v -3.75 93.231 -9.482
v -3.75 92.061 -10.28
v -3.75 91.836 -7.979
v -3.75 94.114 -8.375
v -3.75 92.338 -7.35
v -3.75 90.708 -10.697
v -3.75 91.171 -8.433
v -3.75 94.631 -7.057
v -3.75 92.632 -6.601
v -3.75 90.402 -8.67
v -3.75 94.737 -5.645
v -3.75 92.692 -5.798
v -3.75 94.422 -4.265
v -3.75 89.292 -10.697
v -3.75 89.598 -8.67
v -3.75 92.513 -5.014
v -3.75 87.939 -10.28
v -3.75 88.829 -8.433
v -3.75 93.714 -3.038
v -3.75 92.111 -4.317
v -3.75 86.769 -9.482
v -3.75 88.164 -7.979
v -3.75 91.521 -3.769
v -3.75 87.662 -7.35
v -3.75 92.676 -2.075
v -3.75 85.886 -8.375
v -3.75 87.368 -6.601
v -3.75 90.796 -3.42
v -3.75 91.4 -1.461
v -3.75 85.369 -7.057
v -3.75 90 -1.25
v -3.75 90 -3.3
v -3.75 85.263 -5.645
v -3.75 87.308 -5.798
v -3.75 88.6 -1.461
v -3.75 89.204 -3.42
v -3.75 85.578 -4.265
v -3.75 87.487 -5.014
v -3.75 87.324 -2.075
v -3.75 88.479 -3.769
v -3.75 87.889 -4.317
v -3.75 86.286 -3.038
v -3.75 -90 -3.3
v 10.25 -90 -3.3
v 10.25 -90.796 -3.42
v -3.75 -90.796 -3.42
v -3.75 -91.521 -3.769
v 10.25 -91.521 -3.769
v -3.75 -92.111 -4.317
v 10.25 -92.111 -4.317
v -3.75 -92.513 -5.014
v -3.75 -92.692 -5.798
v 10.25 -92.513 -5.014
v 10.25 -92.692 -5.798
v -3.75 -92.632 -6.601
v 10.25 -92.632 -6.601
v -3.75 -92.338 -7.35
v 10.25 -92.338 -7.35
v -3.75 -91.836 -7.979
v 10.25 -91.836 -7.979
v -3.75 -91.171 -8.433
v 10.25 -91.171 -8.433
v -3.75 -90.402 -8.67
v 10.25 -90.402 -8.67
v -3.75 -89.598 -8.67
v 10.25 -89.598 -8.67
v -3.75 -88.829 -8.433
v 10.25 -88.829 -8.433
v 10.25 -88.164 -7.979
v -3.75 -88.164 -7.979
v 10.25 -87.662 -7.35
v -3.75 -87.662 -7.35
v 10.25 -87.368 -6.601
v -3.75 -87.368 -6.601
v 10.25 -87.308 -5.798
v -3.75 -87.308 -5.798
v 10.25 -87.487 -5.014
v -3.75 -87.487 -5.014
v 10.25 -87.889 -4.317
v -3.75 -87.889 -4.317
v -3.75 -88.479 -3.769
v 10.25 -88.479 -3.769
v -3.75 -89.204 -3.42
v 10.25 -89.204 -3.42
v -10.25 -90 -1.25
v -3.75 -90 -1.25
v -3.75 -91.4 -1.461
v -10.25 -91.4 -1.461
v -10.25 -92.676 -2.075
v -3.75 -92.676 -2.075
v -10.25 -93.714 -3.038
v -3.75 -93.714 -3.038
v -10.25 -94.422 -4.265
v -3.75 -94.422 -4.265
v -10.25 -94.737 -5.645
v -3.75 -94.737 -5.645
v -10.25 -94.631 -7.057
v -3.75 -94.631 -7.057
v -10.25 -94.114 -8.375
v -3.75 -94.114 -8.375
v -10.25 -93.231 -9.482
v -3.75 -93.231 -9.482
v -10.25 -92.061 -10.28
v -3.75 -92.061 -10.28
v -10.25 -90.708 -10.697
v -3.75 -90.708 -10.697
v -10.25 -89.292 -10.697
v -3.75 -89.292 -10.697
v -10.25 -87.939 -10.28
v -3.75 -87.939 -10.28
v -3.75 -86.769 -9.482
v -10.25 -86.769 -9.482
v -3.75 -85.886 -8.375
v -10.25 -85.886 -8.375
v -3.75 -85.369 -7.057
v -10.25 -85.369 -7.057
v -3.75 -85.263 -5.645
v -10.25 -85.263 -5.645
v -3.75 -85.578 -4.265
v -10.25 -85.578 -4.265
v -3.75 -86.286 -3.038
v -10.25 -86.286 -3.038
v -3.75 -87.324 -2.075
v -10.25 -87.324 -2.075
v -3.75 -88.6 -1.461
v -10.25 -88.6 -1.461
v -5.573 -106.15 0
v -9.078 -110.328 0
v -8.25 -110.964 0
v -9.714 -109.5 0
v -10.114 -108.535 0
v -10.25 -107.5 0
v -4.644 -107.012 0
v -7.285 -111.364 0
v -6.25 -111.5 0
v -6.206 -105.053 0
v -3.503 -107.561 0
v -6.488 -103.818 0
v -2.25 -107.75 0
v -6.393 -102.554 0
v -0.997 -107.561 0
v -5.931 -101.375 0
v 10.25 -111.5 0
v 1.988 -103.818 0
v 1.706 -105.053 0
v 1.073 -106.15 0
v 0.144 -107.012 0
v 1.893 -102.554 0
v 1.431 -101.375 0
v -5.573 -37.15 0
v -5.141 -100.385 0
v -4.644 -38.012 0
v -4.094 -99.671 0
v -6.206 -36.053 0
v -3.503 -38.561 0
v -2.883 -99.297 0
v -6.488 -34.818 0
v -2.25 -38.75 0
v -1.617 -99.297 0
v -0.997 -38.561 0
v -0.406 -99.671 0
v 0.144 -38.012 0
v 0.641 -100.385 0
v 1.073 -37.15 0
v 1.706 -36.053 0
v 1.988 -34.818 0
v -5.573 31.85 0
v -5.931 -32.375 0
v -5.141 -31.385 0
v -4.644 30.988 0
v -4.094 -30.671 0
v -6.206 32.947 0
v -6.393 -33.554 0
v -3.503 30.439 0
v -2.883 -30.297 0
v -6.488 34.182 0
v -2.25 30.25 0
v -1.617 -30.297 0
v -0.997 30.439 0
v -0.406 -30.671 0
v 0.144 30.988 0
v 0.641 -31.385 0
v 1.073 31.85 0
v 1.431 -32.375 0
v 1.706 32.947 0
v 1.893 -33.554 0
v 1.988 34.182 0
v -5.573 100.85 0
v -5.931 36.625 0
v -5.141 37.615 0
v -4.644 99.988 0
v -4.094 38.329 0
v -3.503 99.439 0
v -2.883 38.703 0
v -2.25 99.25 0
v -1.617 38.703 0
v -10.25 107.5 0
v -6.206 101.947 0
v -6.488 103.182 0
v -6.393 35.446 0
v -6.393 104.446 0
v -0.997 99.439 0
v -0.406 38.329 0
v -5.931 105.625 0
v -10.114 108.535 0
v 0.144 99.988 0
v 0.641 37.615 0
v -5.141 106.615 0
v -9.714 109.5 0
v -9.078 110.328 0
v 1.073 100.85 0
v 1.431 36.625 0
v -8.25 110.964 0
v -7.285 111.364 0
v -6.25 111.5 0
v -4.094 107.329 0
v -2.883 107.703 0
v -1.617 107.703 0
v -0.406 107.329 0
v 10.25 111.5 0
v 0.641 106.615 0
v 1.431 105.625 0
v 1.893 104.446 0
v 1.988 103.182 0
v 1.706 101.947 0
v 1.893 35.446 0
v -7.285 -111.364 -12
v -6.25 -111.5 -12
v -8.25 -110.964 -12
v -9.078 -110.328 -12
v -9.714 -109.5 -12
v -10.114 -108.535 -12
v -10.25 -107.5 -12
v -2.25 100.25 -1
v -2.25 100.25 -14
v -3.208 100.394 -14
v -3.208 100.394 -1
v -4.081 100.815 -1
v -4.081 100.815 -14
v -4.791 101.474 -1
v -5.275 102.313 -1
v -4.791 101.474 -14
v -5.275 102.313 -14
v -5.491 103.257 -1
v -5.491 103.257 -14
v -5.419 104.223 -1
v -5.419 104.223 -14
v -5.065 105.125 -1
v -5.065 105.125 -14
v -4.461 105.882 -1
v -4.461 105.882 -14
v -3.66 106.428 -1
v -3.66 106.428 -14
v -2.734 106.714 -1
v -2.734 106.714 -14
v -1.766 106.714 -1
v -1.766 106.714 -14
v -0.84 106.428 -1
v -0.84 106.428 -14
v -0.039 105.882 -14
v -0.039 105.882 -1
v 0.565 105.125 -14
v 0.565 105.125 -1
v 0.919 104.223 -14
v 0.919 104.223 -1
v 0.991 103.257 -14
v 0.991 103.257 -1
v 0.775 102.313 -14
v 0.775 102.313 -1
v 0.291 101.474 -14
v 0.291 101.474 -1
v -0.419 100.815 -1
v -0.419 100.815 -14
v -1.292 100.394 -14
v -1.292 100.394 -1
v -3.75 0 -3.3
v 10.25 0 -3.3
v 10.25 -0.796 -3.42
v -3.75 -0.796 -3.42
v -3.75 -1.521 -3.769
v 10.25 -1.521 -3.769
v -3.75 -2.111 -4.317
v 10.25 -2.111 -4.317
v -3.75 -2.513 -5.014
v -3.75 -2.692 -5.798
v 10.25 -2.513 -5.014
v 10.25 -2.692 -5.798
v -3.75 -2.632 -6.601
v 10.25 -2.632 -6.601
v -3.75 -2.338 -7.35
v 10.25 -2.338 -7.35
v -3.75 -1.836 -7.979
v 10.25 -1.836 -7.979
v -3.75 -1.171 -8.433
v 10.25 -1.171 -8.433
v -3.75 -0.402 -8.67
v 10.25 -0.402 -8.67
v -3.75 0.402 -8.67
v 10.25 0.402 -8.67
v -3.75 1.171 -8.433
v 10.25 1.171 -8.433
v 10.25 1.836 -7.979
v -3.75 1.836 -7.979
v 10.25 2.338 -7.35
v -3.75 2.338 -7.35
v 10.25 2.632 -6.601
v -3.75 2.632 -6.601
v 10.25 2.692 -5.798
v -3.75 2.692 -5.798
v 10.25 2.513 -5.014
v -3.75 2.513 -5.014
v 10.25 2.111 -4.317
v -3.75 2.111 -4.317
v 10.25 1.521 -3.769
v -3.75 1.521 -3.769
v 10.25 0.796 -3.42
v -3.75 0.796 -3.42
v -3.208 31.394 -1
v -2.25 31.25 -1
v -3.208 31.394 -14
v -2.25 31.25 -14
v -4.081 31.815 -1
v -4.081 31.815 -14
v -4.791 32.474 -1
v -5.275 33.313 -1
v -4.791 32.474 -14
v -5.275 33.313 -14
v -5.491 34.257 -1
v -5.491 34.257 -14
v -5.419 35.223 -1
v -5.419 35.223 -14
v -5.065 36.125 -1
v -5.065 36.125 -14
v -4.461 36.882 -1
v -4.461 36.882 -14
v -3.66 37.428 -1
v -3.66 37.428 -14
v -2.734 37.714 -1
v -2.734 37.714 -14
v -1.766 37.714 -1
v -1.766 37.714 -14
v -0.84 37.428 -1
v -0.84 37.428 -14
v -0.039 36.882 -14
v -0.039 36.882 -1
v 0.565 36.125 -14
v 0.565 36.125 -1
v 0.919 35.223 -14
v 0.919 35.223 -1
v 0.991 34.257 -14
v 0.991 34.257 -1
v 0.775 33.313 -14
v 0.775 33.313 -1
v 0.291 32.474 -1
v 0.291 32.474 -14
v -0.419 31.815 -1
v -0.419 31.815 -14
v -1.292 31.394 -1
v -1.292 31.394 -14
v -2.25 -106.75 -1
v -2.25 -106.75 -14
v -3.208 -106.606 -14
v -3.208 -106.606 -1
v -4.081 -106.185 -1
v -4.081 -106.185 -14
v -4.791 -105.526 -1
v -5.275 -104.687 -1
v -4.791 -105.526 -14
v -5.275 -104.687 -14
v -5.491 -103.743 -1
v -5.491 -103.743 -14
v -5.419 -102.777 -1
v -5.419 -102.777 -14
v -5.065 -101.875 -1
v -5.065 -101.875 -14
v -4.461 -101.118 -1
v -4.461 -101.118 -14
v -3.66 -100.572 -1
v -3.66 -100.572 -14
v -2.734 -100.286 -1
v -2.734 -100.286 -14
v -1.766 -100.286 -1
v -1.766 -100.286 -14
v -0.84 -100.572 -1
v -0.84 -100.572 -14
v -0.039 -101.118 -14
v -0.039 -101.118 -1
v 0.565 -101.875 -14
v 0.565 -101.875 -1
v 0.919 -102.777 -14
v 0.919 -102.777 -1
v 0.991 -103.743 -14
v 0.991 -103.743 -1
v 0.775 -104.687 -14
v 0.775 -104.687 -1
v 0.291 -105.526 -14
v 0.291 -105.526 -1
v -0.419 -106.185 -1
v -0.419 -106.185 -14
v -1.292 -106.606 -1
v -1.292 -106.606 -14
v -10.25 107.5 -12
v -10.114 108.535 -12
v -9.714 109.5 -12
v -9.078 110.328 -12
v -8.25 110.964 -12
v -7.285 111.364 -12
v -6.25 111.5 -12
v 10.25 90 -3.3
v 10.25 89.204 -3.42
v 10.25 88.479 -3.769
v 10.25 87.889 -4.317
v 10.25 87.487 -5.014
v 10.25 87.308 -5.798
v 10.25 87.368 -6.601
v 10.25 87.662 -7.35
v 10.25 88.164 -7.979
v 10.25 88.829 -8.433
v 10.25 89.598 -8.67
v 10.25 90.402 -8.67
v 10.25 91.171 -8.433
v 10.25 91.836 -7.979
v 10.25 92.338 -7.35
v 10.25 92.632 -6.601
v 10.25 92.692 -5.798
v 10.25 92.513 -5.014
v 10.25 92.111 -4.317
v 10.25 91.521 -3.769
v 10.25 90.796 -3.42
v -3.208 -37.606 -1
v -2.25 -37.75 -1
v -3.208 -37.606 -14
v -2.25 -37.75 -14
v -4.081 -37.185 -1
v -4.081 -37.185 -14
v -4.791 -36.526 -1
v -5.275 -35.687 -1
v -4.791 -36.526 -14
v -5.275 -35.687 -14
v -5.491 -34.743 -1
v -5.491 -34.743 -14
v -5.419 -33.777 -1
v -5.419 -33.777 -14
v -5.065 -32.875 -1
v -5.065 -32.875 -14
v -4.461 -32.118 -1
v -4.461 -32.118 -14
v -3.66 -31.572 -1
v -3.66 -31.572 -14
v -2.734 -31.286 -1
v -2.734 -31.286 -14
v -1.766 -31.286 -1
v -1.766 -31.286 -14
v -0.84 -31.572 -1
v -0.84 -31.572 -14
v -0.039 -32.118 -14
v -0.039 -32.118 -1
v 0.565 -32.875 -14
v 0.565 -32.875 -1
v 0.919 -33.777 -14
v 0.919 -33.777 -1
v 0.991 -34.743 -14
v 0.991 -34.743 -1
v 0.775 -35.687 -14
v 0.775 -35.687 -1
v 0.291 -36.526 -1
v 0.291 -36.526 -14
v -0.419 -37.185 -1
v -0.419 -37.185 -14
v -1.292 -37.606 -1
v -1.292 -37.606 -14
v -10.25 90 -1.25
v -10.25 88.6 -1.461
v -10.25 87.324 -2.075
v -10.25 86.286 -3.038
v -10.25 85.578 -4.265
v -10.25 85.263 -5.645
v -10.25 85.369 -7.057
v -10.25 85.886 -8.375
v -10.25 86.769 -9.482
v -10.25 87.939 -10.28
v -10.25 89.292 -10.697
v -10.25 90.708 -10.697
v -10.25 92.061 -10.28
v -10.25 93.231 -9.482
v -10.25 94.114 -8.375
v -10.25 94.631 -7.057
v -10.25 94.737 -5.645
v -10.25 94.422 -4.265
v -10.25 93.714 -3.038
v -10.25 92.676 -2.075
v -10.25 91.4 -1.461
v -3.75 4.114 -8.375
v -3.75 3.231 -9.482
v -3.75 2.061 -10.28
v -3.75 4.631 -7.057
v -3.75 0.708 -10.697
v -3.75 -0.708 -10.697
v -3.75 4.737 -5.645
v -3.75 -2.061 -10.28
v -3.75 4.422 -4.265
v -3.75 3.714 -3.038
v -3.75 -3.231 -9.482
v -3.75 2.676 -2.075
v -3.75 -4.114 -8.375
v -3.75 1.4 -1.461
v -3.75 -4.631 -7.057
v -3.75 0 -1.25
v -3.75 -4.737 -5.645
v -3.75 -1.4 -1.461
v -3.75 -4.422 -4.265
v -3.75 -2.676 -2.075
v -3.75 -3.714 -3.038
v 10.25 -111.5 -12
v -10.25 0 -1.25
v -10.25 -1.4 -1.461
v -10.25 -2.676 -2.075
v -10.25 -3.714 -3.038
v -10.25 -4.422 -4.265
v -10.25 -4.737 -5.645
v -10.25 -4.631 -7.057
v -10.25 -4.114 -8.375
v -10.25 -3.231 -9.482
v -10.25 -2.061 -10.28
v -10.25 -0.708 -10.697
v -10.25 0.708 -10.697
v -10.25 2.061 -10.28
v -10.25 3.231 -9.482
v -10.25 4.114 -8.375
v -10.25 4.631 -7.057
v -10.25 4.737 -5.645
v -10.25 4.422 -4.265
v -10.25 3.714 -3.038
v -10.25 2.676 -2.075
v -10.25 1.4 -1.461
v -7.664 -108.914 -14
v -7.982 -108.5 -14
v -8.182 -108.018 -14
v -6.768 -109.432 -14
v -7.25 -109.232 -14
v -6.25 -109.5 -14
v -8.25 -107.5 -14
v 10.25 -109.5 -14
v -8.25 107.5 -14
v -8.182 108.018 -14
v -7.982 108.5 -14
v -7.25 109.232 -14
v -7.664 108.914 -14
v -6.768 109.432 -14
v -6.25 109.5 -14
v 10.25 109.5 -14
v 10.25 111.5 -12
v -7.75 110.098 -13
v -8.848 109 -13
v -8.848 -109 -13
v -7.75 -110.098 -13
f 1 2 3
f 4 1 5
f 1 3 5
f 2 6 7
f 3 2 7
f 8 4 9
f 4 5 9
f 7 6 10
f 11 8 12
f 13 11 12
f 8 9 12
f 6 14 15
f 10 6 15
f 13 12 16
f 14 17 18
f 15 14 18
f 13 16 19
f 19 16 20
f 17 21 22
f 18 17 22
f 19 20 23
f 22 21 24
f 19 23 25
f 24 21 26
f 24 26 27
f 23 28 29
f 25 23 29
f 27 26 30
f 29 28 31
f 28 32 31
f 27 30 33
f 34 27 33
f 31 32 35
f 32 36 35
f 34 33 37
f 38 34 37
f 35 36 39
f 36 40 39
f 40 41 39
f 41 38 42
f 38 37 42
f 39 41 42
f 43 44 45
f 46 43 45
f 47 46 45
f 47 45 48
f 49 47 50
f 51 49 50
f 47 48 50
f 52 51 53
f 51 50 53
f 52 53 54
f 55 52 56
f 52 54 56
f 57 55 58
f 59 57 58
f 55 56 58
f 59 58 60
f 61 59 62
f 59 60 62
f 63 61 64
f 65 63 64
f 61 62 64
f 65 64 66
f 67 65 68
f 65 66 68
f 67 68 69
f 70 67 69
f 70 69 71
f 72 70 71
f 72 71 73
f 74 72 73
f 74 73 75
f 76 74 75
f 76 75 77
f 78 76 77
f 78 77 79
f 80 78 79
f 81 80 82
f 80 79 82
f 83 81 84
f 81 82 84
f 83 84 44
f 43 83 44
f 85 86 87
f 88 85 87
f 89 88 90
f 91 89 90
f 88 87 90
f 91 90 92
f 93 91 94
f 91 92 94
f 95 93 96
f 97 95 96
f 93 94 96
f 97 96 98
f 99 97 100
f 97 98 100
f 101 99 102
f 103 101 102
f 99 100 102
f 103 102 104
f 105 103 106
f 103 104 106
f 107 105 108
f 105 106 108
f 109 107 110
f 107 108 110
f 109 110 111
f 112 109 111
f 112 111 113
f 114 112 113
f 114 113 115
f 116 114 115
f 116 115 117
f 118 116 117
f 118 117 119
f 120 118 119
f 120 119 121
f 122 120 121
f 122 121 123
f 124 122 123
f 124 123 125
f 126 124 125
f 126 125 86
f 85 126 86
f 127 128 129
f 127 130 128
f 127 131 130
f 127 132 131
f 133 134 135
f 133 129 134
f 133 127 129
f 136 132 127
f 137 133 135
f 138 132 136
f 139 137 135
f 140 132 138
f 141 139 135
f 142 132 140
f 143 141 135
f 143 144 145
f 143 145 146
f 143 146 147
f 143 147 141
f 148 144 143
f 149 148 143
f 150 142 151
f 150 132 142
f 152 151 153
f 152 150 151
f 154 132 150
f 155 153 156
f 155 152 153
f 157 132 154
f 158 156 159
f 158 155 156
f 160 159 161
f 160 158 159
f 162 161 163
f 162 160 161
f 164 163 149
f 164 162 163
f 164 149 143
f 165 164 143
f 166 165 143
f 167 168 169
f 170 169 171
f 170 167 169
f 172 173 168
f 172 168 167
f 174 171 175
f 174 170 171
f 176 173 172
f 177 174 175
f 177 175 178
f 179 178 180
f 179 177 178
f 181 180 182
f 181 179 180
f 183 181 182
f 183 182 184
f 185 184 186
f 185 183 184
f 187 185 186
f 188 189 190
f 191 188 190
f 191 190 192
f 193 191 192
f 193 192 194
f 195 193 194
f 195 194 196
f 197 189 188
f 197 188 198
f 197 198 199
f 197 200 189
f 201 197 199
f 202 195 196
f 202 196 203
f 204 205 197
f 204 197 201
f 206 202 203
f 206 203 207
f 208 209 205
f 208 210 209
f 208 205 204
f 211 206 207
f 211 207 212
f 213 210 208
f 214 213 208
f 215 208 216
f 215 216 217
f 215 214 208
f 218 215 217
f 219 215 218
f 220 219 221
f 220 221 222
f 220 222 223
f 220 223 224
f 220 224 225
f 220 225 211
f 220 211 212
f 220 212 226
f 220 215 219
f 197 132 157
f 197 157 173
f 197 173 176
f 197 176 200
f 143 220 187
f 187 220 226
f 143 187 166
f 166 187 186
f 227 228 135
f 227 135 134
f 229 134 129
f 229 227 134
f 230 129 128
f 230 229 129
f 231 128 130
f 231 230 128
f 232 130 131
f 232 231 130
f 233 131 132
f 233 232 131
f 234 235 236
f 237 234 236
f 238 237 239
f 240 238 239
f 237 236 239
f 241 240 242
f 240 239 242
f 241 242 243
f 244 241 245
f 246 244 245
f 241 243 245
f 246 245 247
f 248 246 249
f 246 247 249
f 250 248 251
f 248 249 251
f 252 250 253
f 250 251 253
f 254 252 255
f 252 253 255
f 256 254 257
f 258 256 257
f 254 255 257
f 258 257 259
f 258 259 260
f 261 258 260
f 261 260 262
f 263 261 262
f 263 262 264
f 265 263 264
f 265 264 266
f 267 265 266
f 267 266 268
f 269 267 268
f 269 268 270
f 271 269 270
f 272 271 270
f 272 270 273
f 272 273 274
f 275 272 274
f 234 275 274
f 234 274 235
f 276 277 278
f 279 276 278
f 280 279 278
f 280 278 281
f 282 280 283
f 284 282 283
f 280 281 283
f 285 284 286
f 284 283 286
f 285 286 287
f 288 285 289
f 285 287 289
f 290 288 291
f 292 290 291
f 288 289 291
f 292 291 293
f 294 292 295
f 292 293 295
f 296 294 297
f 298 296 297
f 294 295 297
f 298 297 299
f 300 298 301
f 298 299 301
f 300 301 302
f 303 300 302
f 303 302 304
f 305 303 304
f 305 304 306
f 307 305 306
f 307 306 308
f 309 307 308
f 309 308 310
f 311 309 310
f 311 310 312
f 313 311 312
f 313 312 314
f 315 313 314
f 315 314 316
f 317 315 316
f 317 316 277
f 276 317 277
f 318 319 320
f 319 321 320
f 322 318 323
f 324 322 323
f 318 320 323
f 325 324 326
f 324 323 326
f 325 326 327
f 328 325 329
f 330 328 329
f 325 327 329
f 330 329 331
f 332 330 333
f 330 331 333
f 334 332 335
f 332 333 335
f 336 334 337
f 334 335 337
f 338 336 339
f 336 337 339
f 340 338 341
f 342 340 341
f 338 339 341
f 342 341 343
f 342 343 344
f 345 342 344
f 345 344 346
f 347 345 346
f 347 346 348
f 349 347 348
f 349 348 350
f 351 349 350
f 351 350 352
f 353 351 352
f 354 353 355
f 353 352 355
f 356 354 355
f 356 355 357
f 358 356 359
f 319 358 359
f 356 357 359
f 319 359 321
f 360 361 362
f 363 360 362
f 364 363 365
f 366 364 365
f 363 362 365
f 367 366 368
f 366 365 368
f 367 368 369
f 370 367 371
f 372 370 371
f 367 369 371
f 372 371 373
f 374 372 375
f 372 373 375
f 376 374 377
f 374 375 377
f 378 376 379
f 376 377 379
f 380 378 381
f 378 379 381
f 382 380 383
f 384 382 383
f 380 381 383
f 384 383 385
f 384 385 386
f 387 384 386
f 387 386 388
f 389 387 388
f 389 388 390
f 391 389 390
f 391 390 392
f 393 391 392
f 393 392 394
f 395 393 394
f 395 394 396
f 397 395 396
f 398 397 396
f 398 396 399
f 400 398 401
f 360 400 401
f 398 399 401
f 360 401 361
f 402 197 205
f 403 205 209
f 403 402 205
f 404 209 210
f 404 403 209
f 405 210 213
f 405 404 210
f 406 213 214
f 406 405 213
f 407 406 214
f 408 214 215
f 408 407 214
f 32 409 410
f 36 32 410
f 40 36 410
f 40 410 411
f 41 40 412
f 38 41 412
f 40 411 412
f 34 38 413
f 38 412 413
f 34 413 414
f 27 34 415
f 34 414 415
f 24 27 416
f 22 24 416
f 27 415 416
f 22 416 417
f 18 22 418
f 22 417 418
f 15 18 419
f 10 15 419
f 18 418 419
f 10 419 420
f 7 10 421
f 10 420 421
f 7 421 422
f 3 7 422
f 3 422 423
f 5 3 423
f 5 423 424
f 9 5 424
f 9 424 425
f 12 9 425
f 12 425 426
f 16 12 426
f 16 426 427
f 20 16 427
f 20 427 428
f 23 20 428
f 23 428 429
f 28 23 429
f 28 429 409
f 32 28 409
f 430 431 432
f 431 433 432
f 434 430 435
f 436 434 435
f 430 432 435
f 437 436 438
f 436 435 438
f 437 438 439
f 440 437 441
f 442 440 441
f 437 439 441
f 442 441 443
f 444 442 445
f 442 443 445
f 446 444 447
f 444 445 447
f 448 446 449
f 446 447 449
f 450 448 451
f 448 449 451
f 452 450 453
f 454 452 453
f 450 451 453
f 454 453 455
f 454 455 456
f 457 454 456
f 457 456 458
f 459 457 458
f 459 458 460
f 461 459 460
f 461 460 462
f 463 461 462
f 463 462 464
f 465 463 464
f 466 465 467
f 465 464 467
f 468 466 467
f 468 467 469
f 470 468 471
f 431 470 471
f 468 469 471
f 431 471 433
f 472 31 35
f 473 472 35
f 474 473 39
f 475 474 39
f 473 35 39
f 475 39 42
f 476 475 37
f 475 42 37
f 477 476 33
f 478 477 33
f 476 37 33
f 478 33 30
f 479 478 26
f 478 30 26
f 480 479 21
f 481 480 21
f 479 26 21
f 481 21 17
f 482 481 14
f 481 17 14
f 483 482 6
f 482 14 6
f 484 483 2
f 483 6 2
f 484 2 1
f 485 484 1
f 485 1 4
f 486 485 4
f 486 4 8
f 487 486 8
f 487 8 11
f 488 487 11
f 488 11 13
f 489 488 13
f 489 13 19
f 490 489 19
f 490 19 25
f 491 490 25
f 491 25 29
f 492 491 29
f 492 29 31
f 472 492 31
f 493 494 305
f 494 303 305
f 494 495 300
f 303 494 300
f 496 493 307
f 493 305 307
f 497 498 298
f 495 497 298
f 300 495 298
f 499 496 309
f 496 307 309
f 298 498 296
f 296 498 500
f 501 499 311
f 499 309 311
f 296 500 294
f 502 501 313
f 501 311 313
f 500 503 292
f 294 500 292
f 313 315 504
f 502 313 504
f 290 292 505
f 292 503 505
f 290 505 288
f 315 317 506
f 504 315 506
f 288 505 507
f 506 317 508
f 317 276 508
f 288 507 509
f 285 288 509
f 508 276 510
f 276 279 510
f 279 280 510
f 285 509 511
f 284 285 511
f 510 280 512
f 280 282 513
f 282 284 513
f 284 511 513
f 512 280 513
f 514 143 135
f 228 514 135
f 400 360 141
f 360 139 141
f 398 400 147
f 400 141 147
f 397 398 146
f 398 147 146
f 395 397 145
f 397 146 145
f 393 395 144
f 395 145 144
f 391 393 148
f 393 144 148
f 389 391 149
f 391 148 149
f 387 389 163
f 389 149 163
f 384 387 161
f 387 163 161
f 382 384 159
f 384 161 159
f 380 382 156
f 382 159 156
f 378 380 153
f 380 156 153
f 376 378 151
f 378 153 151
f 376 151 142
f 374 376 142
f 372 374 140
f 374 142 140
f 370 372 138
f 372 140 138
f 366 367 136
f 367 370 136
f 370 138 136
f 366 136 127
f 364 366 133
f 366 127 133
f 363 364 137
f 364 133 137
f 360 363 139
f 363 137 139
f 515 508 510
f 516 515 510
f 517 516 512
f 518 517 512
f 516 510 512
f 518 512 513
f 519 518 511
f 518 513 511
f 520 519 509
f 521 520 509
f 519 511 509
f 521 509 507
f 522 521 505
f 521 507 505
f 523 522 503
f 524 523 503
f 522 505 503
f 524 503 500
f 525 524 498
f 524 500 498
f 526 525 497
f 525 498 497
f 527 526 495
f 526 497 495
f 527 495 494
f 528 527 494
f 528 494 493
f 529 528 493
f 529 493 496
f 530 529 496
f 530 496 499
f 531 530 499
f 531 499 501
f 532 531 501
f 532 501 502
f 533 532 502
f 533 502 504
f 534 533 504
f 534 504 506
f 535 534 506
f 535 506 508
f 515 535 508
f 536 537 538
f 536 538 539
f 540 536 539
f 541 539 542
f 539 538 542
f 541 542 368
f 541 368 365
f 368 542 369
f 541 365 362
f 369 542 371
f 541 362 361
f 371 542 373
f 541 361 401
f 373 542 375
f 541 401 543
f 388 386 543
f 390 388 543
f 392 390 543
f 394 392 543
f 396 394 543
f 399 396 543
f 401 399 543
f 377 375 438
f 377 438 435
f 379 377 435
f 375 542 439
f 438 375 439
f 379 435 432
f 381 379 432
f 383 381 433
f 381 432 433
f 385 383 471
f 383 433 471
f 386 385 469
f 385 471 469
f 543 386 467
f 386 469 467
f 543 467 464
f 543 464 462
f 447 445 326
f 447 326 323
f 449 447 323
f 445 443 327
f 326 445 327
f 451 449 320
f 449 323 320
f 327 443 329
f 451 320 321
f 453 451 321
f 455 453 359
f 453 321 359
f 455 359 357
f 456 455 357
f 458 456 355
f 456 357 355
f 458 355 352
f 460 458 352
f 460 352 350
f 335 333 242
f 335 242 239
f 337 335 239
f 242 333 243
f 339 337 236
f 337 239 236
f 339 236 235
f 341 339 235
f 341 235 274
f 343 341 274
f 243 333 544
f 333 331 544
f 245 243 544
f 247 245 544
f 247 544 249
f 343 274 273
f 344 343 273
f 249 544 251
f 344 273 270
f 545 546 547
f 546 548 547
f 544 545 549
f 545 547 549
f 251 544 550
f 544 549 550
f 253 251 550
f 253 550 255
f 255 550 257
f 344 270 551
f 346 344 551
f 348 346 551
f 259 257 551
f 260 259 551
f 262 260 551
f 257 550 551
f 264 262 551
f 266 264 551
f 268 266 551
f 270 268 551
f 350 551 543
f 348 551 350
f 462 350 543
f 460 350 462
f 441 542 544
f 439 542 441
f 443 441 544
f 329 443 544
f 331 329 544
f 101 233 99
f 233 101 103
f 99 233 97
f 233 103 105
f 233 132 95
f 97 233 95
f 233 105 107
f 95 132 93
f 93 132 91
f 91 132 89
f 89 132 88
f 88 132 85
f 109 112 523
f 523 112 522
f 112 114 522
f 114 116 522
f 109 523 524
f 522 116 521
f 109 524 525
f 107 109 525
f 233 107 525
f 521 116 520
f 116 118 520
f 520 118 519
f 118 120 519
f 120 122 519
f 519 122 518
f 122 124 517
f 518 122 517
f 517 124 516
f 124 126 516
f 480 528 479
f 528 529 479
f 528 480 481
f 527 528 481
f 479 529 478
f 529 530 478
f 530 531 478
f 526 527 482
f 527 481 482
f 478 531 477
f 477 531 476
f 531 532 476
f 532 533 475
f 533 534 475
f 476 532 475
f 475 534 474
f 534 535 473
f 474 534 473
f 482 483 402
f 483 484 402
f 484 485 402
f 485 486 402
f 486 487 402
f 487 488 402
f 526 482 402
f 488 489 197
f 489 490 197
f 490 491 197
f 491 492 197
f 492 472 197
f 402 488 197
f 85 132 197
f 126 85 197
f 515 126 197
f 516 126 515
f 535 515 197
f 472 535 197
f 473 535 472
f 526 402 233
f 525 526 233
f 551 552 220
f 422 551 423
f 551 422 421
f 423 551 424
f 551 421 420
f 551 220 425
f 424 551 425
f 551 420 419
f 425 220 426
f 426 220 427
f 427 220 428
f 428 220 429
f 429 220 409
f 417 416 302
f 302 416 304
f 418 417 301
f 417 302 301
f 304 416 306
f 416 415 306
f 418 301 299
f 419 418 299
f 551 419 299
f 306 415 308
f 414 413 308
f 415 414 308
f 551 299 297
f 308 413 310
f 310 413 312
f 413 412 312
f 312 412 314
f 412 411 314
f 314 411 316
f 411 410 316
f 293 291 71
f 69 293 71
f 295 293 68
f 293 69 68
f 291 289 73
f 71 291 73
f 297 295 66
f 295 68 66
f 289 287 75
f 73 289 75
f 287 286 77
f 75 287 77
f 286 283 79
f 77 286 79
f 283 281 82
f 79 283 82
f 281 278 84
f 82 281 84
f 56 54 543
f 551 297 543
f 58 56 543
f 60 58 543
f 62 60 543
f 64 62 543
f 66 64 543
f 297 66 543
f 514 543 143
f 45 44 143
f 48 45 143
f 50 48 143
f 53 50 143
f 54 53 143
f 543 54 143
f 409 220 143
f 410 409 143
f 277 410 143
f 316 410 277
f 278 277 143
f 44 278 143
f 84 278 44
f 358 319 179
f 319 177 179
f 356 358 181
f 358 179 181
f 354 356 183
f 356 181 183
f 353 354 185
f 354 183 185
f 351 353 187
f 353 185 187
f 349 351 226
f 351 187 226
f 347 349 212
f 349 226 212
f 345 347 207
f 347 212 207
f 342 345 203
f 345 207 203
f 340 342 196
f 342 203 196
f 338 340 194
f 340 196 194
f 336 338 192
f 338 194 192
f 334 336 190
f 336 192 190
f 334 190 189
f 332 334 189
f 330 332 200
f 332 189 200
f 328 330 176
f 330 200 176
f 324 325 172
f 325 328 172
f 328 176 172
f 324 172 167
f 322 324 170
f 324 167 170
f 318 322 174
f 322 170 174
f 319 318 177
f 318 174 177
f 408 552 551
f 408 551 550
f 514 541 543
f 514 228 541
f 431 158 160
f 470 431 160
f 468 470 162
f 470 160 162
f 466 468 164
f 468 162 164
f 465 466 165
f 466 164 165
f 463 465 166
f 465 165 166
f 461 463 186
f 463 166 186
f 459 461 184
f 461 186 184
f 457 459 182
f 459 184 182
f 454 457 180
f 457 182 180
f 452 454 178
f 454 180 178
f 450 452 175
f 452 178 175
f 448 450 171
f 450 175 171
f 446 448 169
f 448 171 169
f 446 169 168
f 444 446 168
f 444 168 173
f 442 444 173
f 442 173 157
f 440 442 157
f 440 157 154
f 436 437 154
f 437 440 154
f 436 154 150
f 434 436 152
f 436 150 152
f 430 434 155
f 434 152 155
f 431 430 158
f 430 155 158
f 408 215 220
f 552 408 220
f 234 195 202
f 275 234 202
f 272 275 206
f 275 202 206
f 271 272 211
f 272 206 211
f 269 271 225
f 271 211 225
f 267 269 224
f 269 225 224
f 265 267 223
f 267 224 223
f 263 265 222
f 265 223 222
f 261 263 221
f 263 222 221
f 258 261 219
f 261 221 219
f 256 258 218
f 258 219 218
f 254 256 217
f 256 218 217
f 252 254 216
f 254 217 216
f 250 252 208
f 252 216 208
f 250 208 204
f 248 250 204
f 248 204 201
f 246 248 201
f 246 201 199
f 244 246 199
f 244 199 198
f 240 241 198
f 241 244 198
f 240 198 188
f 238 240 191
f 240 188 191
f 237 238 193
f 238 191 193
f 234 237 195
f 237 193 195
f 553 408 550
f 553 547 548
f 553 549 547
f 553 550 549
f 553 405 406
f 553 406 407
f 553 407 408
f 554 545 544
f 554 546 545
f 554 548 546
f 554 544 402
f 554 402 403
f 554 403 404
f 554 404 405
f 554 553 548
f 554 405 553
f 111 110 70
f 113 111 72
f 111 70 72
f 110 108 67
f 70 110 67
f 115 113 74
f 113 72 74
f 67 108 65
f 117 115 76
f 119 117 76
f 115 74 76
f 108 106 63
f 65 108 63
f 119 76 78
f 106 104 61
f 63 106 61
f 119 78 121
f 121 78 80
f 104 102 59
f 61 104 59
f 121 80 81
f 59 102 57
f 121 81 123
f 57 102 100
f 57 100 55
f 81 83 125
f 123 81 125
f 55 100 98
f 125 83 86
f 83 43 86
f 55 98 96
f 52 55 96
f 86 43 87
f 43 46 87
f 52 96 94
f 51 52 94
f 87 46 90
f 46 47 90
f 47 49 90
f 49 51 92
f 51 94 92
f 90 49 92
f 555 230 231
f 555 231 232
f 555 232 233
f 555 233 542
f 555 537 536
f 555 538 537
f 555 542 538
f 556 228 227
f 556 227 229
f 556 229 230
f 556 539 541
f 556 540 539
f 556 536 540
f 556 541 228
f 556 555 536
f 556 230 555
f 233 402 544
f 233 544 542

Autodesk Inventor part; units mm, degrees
ref_plane "YZ Plane" through (0, 0, 0) normal (1, 0, 0) x (0, 1, 0)
ref_plane "XZ Plane" through (0, 0, 0) normal (0, 1, 0) x (-1, 0, 0)
ref_plane "XY Plane" through (0, 0, 0) normal (0, 0, 1) x (1, 0, 0)
sketch "Sketch1" plane through (0, 0, 0) normal (0, 0, 1) x (1, 0, 0)
  line L0 (10.25, -111.5) -> (-10.25, -111.5)
  line L1 (-10.25, -111.5) -> (-10.25, 111.5)
  line L2 (-10.25, 111.5) -> (10.25, 111.5)
  line L3 (10.25, 111.5) -> (10.25, -111.5)
  line L4 (10.25, -111.5) -> (-10.25, 111.5) construction
  line L5 (-10.25, -111.5) -> (10.25, 111.5) construction
  line L6 (-2.25, 103.5) -> (-2.25, -103.5) construction
  point P0 (0, 0)
  point P1 (-2.25, 34.5)
  point P2 (-2.25, -34.5)
  point P3 (-2.25, 0)
  dimension "d0" = 20.5
  dimension "d4" = 69
  dimension "d9" = 8
  dimension "d10" = 8
extrude "Extrusion1" add sketch "Sketch1" against normal blind 14
fillet "Fillet1" radius 4 2 edges at (-10.25, 111.5, -7) (-10.25, -111.5, -7)
chamfer "Chamfer1" distance 2 angle 45 5 edges at (2, 111.5, -14) (-9.0784, 110.3284, -14) (-10.25, 0, -14) (-9.0784, -110.3284, -14) (2, -111.5, -14)
hole "Hole1" at (-2.25, 103.5, 0) at (-2.25, 34.5, 0) at (-2.25, -34.5, 0) at (-2.25, -103.5, 0) direction (0, 0, -1) diameter 6.5 end through all
sketch "Sketch2" plane through (-10.25, -107.5, 0) normal (-1, 0, 0) x (0, 0, 1)
  line L0 (-6, 197.5) -> (-6, 17.5) construction
  line L1 (0, 215) -> (0, 0) projected
  point P0 (0, 107.5)
  point P1 (0, 107.5)
  point P2 (-6, 107.5)
  point P3 (-6, 107.5)
  dimension "d24" = 180
  dimension "d25" = 6
hole "Hole2" at (-10.25, 90, -6) at (-10.25, 0, -6) at (-10.25, -90, -6) direction (1, 0, 0) diameter 5.4 end through all counterbore diameter 9.5 counterbore depth 6.5
chamfer "Chamfer2" distance 1 angle 45 4 edges at (-2.25, -100.25, 0) (-2.25, -31.25, 0) (-2.25, 37.75, 0) (-2.25, 106.75, 0)
equation "\"d10\" = d9"
properties part number "Door Bar Front Panel Mount" material "ABS Plastic"
